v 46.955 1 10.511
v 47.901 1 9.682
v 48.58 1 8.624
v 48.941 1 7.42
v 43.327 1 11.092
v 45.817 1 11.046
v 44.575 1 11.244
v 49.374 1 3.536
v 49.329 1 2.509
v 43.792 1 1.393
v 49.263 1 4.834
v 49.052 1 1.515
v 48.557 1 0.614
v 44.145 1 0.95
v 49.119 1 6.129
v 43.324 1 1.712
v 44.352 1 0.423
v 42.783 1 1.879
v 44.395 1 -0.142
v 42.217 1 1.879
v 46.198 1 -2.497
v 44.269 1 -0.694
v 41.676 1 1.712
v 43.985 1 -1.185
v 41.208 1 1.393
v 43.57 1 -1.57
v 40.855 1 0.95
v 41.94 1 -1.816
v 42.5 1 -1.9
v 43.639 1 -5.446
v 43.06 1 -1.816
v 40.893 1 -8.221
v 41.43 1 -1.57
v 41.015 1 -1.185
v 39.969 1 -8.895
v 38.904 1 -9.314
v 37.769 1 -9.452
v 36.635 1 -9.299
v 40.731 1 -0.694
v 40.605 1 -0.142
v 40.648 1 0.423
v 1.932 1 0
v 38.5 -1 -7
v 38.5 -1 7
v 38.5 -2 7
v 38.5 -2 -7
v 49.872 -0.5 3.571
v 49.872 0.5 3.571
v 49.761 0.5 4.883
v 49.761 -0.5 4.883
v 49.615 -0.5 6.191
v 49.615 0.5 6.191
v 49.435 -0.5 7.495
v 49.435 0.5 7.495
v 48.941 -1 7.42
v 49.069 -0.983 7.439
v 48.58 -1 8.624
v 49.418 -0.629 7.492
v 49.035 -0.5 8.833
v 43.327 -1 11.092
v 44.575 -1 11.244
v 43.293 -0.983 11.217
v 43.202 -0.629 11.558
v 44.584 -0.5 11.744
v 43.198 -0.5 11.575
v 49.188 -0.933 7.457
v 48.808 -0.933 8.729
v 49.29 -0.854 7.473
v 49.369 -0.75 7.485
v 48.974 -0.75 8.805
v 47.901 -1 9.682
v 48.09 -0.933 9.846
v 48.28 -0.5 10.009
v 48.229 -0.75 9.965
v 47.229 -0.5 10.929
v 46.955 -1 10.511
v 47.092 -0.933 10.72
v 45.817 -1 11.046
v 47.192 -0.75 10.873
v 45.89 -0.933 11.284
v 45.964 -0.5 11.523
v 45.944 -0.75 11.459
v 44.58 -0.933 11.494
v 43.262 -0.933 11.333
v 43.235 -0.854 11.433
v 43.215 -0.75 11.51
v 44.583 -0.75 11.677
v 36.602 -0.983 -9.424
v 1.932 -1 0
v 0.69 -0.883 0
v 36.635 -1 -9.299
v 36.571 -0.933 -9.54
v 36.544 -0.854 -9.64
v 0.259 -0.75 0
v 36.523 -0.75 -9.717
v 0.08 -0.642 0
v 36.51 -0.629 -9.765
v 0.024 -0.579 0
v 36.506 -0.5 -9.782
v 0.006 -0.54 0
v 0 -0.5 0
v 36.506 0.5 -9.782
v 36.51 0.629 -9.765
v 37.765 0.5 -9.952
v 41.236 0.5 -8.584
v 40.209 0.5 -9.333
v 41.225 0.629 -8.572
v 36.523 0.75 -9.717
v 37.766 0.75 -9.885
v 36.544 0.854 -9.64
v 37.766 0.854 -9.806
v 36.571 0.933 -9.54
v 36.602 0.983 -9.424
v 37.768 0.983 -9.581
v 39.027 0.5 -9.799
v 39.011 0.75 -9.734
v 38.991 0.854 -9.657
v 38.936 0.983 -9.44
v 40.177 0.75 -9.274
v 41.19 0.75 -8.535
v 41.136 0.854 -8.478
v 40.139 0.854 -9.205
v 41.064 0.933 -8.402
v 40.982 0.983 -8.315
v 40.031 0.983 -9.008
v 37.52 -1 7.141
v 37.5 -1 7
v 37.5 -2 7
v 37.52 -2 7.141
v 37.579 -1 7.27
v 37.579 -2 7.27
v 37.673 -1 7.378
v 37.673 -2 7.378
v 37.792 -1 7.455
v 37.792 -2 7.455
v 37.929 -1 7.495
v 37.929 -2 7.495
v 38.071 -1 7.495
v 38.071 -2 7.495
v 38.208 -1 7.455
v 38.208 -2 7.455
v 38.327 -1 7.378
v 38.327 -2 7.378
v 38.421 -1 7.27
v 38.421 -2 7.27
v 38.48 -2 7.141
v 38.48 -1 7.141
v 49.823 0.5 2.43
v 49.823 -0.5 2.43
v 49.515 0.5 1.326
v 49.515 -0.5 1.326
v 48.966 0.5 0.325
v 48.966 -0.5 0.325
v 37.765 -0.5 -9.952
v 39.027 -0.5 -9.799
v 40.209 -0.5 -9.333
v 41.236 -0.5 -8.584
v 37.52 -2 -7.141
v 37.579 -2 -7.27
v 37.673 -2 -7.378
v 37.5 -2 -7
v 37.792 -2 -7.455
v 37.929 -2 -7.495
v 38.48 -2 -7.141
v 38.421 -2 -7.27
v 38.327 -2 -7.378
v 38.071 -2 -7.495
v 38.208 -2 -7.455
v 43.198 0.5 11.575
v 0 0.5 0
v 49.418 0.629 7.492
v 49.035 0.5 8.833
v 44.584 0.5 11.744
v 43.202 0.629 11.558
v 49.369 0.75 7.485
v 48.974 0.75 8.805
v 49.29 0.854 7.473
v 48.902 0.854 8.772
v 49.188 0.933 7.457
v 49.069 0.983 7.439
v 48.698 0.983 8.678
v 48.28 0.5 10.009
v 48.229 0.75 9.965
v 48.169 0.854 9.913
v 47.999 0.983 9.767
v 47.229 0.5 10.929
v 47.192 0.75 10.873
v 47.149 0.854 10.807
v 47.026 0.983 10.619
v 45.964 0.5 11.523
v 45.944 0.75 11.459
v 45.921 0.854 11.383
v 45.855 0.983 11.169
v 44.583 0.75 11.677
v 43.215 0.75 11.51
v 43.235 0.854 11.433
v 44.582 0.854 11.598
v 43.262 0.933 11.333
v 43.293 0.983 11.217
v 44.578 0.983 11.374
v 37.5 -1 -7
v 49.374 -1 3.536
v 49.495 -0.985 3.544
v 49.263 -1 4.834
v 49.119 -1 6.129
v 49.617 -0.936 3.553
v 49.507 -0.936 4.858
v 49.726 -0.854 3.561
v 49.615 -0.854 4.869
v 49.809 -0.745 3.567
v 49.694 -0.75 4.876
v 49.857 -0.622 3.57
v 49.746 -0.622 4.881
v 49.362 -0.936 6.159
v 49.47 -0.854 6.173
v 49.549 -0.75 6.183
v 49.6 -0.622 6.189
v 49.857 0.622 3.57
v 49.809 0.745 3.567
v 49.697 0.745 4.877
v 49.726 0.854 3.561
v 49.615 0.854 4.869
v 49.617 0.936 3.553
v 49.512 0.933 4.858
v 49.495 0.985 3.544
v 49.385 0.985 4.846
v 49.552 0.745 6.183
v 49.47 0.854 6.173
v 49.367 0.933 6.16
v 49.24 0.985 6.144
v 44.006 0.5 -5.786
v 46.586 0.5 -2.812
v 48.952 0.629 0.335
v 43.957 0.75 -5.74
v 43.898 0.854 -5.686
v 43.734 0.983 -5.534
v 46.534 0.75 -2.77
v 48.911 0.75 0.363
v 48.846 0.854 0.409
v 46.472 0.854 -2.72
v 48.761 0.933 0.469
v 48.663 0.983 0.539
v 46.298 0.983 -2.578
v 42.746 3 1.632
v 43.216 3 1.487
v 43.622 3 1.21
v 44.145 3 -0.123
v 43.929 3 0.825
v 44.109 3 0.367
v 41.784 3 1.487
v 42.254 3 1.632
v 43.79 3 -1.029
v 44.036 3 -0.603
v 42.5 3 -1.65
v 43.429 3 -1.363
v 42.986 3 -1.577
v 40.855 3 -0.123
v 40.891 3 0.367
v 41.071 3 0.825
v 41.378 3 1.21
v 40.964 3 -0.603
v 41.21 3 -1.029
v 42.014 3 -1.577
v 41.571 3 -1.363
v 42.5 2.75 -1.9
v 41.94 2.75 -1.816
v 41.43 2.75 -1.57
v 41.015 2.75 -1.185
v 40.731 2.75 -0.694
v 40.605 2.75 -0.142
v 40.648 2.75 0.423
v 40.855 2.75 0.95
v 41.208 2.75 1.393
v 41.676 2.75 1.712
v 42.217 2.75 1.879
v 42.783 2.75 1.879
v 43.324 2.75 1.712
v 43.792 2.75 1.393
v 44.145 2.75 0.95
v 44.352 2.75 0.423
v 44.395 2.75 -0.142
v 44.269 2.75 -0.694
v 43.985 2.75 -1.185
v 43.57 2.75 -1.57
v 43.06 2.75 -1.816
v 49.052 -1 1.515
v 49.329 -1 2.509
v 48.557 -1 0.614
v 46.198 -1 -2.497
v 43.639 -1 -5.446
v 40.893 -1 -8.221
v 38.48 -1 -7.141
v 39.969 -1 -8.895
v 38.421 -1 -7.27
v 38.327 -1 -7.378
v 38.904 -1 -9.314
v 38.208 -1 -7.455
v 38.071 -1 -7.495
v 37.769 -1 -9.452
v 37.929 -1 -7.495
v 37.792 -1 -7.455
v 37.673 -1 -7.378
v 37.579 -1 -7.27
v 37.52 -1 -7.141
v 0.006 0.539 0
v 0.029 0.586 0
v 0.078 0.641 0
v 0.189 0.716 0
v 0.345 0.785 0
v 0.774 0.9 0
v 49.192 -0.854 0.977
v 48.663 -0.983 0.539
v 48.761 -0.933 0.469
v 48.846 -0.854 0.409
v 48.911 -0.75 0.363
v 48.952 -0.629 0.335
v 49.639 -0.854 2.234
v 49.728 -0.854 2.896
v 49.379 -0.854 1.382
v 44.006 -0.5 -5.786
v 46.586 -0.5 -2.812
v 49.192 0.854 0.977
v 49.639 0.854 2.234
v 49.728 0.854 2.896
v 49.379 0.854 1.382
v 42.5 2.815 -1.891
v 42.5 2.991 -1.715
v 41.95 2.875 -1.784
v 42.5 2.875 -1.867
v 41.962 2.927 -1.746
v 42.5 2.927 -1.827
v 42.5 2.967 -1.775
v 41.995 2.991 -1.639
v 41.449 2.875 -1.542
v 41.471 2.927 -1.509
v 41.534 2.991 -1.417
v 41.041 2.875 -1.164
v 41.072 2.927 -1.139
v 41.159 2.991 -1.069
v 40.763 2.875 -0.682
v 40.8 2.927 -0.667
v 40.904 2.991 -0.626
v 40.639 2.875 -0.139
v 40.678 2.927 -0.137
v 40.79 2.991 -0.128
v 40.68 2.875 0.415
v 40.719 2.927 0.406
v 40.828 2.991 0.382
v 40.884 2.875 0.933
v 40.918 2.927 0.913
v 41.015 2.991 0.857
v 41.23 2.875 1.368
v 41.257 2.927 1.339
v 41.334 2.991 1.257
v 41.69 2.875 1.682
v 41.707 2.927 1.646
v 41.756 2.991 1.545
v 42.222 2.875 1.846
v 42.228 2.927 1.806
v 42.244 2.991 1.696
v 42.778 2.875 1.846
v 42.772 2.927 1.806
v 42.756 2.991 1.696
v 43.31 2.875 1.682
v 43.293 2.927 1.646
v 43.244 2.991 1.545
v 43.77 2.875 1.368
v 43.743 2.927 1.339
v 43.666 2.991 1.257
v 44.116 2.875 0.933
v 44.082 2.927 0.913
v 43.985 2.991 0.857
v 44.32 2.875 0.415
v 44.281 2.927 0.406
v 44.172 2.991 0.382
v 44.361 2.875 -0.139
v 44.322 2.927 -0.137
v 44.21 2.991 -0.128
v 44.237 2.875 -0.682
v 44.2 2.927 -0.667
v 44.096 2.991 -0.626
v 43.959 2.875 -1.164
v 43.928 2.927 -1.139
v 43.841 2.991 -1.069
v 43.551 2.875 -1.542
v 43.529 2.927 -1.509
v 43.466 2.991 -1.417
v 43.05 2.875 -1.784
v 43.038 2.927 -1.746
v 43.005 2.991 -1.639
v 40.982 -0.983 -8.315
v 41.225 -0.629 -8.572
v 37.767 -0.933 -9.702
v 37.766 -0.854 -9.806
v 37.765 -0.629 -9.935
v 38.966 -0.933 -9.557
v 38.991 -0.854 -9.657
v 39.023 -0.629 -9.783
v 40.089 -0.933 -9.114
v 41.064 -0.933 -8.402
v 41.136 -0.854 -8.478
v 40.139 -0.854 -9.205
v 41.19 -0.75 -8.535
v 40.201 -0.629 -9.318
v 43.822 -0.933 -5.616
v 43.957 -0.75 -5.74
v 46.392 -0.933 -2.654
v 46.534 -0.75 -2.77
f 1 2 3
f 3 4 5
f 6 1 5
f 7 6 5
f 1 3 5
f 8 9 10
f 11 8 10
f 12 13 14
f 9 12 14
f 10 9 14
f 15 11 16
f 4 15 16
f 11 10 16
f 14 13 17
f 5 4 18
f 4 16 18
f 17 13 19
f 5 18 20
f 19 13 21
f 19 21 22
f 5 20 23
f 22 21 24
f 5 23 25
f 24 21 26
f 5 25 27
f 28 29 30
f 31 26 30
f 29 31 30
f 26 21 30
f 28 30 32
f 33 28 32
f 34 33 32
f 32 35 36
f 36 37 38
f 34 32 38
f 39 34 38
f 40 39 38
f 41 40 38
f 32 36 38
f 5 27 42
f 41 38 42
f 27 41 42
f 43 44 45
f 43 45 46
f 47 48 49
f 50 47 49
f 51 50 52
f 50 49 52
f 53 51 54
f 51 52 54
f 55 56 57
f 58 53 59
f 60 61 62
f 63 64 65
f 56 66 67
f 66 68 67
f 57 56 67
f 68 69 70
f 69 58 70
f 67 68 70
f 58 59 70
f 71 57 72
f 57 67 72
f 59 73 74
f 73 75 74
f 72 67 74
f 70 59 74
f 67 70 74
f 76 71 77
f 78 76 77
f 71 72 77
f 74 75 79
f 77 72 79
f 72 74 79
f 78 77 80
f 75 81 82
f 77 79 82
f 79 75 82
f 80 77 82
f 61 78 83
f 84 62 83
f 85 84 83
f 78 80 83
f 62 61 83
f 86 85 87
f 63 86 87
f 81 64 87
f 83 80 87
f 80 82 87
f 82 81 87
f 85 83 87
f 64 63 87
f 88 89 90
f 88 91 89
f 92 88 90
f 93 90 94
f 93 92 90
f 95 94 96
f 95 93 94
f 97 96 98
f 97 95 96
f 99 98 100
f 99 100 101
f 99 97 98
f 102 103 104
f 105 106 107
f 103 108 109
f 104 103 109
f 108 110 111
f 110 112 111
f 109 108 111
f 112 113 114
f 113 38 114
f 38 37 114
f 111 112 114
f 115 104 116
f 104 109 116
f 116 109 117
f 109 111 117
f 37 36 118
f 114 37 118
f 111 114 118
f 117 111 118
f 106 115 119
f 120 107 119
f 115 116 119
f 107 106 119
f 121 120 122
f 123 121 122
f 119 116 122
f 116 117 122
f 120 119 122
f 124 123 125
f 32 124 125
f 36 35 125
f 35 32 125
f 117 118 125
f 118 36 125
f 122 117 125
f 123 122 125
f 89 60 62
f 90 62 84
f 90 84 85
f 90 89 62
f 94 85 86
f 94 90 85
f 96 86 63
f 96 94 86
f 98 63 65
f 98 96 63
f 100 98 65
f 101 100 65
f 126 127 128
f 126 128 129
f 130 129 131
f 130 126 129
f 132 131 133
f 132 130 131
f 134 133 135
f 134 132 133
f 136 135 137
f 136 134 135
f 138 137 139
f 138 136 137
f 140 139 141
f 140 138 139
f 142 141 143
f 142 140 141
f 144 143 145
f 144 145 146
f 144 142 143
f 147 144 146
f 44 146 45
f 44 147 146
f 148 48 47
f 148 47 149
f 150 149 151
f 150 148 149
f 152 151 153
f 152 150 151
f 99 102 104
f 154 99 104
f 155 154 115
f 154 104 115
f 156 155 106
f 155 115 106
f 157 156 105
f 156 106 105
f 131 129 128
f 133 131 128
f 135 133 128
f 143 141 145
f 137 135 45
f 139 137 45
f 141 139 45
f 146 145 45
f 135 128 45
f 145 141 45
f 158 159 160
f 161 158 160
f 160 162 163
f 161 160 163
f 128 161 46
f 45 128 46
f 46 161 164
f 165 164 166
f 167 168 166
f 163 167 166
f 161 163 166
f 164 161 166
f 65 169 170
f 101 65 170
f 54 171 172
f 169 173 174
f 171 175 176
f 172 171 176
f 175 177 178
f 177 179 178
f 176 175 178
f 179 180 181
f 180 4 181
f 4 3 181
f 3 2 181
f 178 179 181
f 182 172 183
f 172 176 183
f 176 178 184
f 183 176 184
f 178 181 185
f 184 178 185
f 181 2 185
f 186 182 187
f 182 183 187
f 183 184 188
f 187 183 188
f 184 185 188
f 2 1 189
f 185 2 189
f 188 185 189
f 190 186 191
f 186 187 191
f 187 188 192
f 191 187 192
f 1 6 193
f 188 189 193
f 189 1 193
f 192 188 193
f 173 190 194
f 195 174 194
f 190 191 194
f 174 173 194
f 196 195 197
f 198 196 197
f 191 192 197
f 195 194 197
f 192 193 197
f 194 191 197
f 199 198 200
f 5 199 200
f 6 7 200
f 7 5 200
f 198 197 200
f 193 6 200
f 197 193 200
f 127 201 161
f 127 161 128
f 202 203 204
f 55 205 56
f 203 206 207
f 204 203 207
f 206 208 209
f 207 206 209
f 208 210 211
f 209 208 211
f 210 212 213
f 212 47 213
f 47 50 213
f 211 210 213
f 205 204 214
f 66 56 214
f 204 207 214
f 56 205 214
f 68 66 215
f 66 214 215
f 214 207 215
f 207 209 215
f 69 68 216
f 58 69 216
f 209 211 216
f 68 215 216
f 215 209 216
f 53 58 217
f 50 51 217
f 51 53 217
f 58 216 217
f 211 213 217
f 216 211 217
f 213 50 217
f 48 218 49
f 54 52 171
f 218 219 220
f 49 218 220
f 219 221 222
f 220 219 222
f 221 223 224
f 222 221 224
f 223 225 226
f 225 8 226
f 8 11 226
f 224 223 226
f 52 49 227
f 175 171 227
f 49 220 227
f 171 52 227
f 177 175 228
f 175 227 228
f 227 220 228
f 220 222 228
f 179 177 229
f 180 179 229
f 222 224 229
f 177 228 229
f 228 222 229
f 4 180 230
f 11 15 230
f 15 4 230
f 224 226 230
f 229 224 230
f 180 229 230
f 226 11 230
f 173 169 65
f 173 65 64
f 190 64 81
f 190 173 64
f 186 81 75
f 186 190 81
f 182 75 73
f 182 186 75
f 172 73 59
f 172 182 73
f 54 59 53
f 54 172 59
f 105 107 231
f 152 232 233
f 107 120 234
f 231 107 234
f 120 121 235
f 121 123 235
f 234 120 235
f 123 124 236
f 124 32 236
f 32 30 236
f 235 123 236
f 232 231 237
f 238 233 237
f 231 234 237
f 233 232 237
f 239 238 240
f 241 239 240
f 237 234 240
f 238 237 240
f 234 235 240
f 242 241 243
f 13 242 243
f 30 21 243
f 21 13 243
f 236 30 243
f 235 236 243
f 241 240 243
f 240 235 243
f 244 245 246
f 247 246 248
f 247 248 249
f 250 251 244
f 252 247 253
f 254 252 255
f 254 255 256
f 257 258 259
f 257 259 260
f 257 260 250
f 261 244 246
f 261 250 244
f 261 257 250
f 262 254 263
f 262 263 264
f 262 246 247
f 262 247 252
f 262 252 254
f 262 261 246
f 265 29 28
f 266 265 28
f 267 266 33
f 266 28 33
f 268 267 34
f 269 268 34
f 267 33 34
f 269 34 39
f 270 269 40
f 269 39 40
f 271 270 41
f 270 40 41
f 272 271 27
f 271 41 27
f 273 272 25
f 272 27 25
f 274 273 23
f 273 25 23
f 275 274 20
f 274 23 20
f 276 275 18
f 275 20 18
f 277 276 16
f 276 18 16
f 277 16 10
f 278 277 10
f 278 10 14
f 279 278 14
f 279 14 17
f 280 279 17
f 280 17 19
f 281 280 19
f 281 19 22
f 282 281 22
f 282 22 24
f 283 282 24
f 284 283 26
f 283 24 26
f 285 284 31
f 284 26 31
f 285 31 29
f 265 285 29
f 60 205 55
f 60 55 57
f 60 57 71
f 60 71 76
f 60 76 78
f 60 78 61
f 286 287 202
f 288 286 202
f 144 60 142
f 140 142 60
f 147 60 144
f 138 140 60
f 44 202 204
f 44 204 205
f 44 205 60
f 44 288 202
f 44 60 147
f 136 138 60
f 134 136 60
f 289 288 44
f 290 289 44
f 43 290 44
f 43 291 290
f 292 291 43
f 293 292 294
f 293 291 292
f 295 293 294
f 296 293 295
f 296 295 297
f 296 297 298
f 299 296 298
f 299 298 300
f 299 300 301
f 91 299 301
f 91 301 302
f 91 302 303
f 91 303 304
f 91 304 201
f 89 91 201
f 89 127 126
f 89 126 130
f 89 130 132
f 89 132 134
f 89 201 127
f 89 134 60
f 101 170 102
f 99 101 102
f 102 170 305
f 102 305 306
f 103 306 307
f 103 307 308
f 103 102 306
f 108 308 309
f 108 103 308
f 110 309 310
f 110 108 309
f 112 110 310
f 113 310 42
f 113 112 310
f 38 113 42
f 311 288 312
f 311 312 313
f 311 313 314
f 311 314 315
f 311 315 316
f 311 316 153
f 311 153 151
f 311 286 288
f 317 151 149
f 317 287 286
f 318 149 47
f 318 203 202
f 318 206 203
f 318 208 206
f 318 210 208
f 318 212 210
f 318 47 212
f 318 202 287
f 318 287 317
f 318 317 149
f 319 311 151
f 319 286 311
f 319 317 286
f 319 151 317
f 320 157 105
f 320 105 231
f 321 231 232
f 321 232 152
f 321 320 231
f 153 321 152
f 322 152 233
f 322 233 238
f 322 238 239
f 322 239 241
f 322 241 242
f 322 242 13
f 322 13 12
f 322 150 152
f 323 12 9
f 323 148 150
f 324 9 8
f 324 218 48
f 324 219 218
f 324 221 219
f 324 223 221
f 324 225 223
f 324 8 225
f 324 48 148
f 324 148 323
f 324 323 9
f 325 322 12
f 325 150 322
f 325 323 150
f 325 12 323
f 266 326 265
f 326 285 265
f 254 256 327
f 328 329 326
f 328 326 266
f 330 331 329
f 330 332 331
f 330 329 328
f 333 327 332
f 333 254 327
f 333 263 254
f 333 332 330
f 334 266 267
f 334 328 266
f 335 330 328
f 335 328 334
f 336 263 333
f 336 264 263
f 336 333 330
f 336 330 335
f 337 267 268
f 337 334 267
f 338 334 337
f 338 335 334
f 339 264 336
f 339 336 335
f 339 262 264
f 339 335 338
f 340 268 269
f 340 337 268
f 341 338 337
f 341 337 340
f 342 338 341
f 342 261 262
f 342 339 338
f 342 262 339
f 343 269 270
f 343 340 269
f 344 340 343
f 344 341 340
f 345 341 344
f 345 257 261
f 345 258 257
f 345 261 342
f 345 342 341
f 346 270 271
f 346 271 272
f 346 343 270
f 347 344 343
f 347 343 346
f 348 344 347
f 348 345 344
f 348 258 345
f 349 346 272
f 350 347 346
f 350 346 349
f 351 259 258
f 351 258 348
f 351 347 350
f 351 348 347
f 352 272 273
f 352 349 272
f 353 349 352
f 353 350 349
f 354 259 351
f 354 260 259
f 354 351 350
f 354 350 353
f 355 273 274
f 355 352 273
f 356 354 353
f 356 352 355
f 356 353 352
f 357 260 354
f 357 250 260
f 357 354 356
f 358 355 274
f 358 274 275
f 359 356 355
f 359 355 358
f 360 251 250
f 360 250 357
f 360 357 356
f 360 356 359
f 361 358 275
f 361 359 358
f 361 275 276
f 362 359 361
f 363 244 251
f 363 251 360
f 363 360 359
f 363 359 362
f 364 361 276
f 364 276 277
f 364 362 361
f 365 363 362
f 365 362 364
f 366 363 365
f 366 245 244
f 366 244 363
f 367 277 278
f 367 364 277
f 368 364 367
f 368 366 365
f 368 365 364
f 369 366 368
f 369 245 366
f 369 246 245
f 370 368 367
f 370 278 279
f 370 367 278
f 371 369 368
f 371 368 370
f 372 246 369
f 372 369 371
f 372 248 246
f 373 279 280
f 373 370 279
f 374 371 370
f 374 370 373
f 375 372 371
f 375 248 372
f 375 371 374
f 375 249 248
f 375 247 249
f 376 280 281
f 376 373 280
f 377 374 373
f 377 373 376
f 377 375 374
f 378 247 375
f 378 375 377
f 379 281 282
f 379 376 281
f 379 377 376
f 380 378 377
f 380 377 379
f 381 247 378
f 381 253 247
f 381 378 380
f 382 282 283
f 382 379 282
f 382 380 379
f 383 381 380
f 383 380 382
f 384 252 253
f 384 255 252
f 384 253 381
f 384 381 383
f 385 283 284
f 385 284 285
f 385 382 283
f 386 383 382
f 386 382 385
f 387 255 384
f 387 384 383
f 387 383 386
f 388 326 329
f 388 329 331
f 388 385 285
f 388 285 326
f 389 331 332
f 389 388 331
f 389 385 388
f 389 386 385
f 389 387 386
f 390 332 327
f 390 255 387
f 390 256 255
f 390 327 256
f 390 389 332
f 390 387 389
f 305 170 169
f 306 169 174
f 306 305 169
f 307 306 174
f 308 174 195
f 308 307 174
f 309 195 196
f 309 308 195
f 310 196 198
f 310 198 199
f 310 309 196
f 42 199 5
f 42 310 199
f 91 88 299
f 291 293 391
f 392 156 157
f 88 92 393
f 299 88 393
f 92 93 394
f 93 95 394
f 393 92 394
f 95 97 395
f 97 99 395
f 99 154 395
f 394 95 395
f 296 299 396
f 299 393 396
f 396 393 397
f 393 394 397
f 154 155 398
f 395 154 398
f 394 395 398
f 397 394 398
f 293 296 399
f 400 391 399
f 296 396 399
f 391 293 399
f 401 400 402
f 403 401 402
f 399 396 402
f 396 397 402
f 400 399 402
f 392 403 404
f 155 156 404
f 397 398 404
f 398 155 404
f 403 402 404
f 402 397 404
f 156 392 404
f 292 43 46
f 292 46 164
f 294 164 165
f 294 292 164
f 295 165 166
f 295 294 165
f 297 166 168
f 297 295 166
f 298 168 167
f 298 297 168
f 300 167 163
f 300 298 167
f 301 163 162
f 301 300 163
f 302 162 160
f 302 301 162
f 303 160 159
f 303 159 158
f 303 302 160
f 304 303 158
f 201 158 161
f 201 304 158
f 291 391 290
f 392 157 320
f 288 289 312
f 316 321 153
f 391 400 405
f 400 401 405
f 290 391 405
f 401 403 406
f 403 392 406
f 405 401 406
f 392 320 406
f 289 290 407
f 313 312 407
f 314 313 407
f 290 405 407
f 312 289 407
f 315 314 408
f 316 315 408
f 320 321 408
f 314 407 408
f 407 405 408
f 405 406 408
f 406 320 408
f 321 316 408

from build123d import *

# Parameters (mm, degrees)
BOSS_EXTRUDE2_DEPTH = 1
BOSS_EXTRUDE3_DEPTH = 1
CUT_EXTRUDE3_START  = -2
CUT_EXTRUDE3_DEPTH  = 2
FILLET1_R           = 5
FILLET2_R           = 0.5
SKETCH2_R           = 1.9
BOSS_EXTRUDE4_DEPTH = 2
FILLET3_R           = 0.25


# Read off the part's stored shape, not the designer's step: Cut-Extrude3
with BuildPart() as part:
    # Sketch1 → Boss-Extrude2 (new, symmetric)
    with BuildSketch(Plane(origin=(0, 0, 0), x_dir=(1, 0, 0), z_dir=(0, 1, 0))):
        with BuildLine():
            Line((48.296291314, -12.940952255), (0, 0))
            Line((0, 0), (48.296291314, 12.940952255))
            ThreePointArc((48.296291314, 12.940952255), (50, 0), (48.296291314, -12.940952255))
        make_face()
    extrude(amount=BOSS_EXTRUDE2_DEPTH, both=True)

    # Sketch3 → Boss-Extrude3 (add)
    with BuildSketch(Plane(origin=(0, -1, 0), x_dir=(-1, 0, 0), z_dir=(0, -1, 0))):
        with BuildLine():
            Line((-38.5, -7), (-38.5, 7))
            ThreePointArc((-38.5, 7), (-38, 7.5), (-37.5, 7))
            Line((-37.5, 7), (-37.5, -7))
            ThreePointArc((-37.5, -7), (-38, -7.5), (-38.5, -7))
        make_face()
    extrude(amount=BOSS_EXTRUDE3_DEPTH)

    # Cut-Extrude3 outline → Cut-Extrude3 (cut)
    with BuildSketch(Plane(origin=(0, 1, 0), x_dir=(1, 0, 0), z_dir=(0, 1, 0)).offset(CUT_EXTRUDE3_START)):
        with BuildLine():
            ThreePointArc((39.129720832, 10.484777097), (44.969397941, 4.720942194), (49.96810207, -1.785714286))
            ThreePointArc((49.96810207, -1.785714286), (49.680896013, 5.639908806), (48.296291314, 12.940952255))
            Line((48.296291314, 12.940952255), (39.129720832, 10.484777097))
        make_face()
    extrude(amount=CUT_EXTRUDE3_DEPTH, mode=Mode.SUBTRACT)

    # Fillet1
    fillet1_edges = [part.edges().sort_by_distance(p)[0] for p in [
        (39.129720832, 0, -10.484777097),
        (49.96810207, 0, 1.785714286),
        (48.296291314, 0, 12.940952255),
    ]]
    fillet(fillet1_edges, radius=FILLET1_R)

    # Fillet2
    fillet2_edges = [part.edges().sort_by_distance(p)[0] for p in [
        (18.252899917, -1, -4.890849792),
        (18.252899917, 1, -4.890849792),
        (45.320316883, -1, -4.32008237),
        (49.692435611, -1, 5.537313704),
        (21.598758088, -1, 5.787369787),
        (47.228674266, -1, 10.929424828),
        (49.700770587, -1, 1.869330184),
        (39.027043508, -1, -9.799142423),
        (45.320316883, 1, -4.32008237),
        (21.598758088, 1, 5.787369787),
        (49.692435611, 1, 5.537313704),
        (47.228674266, 1, 10.929424828),
        (49.700770587, 1, 1.869330184),
        (39.027043508, 1, -9.799142423),
    ]]
    fillet(fillet2_edges, radius=FILLET2_R)

    # Sketch2 → Boss-Extrude4 (add)
    with BuildSketch(Plane(origin=(0, 1, 0), x_dir=(1, 0, 0), z_dir=(0, 1, 0))):
        with Locations(Location((42.5, 0, 0), (0, 0, 90))):
            Circle(SKETCH2_R)
    extrude(amount=BOSS_EXTRUDE4_DEPTH)

    # Fillet3
    fillet3_edges = [part.edges().sort_by_distance(p)[0] for p in [
        (42.5, 3, 1.9),
    ]]
    fillet(fillet3_edges, radius=FILLET3_R)


solid = part.part
